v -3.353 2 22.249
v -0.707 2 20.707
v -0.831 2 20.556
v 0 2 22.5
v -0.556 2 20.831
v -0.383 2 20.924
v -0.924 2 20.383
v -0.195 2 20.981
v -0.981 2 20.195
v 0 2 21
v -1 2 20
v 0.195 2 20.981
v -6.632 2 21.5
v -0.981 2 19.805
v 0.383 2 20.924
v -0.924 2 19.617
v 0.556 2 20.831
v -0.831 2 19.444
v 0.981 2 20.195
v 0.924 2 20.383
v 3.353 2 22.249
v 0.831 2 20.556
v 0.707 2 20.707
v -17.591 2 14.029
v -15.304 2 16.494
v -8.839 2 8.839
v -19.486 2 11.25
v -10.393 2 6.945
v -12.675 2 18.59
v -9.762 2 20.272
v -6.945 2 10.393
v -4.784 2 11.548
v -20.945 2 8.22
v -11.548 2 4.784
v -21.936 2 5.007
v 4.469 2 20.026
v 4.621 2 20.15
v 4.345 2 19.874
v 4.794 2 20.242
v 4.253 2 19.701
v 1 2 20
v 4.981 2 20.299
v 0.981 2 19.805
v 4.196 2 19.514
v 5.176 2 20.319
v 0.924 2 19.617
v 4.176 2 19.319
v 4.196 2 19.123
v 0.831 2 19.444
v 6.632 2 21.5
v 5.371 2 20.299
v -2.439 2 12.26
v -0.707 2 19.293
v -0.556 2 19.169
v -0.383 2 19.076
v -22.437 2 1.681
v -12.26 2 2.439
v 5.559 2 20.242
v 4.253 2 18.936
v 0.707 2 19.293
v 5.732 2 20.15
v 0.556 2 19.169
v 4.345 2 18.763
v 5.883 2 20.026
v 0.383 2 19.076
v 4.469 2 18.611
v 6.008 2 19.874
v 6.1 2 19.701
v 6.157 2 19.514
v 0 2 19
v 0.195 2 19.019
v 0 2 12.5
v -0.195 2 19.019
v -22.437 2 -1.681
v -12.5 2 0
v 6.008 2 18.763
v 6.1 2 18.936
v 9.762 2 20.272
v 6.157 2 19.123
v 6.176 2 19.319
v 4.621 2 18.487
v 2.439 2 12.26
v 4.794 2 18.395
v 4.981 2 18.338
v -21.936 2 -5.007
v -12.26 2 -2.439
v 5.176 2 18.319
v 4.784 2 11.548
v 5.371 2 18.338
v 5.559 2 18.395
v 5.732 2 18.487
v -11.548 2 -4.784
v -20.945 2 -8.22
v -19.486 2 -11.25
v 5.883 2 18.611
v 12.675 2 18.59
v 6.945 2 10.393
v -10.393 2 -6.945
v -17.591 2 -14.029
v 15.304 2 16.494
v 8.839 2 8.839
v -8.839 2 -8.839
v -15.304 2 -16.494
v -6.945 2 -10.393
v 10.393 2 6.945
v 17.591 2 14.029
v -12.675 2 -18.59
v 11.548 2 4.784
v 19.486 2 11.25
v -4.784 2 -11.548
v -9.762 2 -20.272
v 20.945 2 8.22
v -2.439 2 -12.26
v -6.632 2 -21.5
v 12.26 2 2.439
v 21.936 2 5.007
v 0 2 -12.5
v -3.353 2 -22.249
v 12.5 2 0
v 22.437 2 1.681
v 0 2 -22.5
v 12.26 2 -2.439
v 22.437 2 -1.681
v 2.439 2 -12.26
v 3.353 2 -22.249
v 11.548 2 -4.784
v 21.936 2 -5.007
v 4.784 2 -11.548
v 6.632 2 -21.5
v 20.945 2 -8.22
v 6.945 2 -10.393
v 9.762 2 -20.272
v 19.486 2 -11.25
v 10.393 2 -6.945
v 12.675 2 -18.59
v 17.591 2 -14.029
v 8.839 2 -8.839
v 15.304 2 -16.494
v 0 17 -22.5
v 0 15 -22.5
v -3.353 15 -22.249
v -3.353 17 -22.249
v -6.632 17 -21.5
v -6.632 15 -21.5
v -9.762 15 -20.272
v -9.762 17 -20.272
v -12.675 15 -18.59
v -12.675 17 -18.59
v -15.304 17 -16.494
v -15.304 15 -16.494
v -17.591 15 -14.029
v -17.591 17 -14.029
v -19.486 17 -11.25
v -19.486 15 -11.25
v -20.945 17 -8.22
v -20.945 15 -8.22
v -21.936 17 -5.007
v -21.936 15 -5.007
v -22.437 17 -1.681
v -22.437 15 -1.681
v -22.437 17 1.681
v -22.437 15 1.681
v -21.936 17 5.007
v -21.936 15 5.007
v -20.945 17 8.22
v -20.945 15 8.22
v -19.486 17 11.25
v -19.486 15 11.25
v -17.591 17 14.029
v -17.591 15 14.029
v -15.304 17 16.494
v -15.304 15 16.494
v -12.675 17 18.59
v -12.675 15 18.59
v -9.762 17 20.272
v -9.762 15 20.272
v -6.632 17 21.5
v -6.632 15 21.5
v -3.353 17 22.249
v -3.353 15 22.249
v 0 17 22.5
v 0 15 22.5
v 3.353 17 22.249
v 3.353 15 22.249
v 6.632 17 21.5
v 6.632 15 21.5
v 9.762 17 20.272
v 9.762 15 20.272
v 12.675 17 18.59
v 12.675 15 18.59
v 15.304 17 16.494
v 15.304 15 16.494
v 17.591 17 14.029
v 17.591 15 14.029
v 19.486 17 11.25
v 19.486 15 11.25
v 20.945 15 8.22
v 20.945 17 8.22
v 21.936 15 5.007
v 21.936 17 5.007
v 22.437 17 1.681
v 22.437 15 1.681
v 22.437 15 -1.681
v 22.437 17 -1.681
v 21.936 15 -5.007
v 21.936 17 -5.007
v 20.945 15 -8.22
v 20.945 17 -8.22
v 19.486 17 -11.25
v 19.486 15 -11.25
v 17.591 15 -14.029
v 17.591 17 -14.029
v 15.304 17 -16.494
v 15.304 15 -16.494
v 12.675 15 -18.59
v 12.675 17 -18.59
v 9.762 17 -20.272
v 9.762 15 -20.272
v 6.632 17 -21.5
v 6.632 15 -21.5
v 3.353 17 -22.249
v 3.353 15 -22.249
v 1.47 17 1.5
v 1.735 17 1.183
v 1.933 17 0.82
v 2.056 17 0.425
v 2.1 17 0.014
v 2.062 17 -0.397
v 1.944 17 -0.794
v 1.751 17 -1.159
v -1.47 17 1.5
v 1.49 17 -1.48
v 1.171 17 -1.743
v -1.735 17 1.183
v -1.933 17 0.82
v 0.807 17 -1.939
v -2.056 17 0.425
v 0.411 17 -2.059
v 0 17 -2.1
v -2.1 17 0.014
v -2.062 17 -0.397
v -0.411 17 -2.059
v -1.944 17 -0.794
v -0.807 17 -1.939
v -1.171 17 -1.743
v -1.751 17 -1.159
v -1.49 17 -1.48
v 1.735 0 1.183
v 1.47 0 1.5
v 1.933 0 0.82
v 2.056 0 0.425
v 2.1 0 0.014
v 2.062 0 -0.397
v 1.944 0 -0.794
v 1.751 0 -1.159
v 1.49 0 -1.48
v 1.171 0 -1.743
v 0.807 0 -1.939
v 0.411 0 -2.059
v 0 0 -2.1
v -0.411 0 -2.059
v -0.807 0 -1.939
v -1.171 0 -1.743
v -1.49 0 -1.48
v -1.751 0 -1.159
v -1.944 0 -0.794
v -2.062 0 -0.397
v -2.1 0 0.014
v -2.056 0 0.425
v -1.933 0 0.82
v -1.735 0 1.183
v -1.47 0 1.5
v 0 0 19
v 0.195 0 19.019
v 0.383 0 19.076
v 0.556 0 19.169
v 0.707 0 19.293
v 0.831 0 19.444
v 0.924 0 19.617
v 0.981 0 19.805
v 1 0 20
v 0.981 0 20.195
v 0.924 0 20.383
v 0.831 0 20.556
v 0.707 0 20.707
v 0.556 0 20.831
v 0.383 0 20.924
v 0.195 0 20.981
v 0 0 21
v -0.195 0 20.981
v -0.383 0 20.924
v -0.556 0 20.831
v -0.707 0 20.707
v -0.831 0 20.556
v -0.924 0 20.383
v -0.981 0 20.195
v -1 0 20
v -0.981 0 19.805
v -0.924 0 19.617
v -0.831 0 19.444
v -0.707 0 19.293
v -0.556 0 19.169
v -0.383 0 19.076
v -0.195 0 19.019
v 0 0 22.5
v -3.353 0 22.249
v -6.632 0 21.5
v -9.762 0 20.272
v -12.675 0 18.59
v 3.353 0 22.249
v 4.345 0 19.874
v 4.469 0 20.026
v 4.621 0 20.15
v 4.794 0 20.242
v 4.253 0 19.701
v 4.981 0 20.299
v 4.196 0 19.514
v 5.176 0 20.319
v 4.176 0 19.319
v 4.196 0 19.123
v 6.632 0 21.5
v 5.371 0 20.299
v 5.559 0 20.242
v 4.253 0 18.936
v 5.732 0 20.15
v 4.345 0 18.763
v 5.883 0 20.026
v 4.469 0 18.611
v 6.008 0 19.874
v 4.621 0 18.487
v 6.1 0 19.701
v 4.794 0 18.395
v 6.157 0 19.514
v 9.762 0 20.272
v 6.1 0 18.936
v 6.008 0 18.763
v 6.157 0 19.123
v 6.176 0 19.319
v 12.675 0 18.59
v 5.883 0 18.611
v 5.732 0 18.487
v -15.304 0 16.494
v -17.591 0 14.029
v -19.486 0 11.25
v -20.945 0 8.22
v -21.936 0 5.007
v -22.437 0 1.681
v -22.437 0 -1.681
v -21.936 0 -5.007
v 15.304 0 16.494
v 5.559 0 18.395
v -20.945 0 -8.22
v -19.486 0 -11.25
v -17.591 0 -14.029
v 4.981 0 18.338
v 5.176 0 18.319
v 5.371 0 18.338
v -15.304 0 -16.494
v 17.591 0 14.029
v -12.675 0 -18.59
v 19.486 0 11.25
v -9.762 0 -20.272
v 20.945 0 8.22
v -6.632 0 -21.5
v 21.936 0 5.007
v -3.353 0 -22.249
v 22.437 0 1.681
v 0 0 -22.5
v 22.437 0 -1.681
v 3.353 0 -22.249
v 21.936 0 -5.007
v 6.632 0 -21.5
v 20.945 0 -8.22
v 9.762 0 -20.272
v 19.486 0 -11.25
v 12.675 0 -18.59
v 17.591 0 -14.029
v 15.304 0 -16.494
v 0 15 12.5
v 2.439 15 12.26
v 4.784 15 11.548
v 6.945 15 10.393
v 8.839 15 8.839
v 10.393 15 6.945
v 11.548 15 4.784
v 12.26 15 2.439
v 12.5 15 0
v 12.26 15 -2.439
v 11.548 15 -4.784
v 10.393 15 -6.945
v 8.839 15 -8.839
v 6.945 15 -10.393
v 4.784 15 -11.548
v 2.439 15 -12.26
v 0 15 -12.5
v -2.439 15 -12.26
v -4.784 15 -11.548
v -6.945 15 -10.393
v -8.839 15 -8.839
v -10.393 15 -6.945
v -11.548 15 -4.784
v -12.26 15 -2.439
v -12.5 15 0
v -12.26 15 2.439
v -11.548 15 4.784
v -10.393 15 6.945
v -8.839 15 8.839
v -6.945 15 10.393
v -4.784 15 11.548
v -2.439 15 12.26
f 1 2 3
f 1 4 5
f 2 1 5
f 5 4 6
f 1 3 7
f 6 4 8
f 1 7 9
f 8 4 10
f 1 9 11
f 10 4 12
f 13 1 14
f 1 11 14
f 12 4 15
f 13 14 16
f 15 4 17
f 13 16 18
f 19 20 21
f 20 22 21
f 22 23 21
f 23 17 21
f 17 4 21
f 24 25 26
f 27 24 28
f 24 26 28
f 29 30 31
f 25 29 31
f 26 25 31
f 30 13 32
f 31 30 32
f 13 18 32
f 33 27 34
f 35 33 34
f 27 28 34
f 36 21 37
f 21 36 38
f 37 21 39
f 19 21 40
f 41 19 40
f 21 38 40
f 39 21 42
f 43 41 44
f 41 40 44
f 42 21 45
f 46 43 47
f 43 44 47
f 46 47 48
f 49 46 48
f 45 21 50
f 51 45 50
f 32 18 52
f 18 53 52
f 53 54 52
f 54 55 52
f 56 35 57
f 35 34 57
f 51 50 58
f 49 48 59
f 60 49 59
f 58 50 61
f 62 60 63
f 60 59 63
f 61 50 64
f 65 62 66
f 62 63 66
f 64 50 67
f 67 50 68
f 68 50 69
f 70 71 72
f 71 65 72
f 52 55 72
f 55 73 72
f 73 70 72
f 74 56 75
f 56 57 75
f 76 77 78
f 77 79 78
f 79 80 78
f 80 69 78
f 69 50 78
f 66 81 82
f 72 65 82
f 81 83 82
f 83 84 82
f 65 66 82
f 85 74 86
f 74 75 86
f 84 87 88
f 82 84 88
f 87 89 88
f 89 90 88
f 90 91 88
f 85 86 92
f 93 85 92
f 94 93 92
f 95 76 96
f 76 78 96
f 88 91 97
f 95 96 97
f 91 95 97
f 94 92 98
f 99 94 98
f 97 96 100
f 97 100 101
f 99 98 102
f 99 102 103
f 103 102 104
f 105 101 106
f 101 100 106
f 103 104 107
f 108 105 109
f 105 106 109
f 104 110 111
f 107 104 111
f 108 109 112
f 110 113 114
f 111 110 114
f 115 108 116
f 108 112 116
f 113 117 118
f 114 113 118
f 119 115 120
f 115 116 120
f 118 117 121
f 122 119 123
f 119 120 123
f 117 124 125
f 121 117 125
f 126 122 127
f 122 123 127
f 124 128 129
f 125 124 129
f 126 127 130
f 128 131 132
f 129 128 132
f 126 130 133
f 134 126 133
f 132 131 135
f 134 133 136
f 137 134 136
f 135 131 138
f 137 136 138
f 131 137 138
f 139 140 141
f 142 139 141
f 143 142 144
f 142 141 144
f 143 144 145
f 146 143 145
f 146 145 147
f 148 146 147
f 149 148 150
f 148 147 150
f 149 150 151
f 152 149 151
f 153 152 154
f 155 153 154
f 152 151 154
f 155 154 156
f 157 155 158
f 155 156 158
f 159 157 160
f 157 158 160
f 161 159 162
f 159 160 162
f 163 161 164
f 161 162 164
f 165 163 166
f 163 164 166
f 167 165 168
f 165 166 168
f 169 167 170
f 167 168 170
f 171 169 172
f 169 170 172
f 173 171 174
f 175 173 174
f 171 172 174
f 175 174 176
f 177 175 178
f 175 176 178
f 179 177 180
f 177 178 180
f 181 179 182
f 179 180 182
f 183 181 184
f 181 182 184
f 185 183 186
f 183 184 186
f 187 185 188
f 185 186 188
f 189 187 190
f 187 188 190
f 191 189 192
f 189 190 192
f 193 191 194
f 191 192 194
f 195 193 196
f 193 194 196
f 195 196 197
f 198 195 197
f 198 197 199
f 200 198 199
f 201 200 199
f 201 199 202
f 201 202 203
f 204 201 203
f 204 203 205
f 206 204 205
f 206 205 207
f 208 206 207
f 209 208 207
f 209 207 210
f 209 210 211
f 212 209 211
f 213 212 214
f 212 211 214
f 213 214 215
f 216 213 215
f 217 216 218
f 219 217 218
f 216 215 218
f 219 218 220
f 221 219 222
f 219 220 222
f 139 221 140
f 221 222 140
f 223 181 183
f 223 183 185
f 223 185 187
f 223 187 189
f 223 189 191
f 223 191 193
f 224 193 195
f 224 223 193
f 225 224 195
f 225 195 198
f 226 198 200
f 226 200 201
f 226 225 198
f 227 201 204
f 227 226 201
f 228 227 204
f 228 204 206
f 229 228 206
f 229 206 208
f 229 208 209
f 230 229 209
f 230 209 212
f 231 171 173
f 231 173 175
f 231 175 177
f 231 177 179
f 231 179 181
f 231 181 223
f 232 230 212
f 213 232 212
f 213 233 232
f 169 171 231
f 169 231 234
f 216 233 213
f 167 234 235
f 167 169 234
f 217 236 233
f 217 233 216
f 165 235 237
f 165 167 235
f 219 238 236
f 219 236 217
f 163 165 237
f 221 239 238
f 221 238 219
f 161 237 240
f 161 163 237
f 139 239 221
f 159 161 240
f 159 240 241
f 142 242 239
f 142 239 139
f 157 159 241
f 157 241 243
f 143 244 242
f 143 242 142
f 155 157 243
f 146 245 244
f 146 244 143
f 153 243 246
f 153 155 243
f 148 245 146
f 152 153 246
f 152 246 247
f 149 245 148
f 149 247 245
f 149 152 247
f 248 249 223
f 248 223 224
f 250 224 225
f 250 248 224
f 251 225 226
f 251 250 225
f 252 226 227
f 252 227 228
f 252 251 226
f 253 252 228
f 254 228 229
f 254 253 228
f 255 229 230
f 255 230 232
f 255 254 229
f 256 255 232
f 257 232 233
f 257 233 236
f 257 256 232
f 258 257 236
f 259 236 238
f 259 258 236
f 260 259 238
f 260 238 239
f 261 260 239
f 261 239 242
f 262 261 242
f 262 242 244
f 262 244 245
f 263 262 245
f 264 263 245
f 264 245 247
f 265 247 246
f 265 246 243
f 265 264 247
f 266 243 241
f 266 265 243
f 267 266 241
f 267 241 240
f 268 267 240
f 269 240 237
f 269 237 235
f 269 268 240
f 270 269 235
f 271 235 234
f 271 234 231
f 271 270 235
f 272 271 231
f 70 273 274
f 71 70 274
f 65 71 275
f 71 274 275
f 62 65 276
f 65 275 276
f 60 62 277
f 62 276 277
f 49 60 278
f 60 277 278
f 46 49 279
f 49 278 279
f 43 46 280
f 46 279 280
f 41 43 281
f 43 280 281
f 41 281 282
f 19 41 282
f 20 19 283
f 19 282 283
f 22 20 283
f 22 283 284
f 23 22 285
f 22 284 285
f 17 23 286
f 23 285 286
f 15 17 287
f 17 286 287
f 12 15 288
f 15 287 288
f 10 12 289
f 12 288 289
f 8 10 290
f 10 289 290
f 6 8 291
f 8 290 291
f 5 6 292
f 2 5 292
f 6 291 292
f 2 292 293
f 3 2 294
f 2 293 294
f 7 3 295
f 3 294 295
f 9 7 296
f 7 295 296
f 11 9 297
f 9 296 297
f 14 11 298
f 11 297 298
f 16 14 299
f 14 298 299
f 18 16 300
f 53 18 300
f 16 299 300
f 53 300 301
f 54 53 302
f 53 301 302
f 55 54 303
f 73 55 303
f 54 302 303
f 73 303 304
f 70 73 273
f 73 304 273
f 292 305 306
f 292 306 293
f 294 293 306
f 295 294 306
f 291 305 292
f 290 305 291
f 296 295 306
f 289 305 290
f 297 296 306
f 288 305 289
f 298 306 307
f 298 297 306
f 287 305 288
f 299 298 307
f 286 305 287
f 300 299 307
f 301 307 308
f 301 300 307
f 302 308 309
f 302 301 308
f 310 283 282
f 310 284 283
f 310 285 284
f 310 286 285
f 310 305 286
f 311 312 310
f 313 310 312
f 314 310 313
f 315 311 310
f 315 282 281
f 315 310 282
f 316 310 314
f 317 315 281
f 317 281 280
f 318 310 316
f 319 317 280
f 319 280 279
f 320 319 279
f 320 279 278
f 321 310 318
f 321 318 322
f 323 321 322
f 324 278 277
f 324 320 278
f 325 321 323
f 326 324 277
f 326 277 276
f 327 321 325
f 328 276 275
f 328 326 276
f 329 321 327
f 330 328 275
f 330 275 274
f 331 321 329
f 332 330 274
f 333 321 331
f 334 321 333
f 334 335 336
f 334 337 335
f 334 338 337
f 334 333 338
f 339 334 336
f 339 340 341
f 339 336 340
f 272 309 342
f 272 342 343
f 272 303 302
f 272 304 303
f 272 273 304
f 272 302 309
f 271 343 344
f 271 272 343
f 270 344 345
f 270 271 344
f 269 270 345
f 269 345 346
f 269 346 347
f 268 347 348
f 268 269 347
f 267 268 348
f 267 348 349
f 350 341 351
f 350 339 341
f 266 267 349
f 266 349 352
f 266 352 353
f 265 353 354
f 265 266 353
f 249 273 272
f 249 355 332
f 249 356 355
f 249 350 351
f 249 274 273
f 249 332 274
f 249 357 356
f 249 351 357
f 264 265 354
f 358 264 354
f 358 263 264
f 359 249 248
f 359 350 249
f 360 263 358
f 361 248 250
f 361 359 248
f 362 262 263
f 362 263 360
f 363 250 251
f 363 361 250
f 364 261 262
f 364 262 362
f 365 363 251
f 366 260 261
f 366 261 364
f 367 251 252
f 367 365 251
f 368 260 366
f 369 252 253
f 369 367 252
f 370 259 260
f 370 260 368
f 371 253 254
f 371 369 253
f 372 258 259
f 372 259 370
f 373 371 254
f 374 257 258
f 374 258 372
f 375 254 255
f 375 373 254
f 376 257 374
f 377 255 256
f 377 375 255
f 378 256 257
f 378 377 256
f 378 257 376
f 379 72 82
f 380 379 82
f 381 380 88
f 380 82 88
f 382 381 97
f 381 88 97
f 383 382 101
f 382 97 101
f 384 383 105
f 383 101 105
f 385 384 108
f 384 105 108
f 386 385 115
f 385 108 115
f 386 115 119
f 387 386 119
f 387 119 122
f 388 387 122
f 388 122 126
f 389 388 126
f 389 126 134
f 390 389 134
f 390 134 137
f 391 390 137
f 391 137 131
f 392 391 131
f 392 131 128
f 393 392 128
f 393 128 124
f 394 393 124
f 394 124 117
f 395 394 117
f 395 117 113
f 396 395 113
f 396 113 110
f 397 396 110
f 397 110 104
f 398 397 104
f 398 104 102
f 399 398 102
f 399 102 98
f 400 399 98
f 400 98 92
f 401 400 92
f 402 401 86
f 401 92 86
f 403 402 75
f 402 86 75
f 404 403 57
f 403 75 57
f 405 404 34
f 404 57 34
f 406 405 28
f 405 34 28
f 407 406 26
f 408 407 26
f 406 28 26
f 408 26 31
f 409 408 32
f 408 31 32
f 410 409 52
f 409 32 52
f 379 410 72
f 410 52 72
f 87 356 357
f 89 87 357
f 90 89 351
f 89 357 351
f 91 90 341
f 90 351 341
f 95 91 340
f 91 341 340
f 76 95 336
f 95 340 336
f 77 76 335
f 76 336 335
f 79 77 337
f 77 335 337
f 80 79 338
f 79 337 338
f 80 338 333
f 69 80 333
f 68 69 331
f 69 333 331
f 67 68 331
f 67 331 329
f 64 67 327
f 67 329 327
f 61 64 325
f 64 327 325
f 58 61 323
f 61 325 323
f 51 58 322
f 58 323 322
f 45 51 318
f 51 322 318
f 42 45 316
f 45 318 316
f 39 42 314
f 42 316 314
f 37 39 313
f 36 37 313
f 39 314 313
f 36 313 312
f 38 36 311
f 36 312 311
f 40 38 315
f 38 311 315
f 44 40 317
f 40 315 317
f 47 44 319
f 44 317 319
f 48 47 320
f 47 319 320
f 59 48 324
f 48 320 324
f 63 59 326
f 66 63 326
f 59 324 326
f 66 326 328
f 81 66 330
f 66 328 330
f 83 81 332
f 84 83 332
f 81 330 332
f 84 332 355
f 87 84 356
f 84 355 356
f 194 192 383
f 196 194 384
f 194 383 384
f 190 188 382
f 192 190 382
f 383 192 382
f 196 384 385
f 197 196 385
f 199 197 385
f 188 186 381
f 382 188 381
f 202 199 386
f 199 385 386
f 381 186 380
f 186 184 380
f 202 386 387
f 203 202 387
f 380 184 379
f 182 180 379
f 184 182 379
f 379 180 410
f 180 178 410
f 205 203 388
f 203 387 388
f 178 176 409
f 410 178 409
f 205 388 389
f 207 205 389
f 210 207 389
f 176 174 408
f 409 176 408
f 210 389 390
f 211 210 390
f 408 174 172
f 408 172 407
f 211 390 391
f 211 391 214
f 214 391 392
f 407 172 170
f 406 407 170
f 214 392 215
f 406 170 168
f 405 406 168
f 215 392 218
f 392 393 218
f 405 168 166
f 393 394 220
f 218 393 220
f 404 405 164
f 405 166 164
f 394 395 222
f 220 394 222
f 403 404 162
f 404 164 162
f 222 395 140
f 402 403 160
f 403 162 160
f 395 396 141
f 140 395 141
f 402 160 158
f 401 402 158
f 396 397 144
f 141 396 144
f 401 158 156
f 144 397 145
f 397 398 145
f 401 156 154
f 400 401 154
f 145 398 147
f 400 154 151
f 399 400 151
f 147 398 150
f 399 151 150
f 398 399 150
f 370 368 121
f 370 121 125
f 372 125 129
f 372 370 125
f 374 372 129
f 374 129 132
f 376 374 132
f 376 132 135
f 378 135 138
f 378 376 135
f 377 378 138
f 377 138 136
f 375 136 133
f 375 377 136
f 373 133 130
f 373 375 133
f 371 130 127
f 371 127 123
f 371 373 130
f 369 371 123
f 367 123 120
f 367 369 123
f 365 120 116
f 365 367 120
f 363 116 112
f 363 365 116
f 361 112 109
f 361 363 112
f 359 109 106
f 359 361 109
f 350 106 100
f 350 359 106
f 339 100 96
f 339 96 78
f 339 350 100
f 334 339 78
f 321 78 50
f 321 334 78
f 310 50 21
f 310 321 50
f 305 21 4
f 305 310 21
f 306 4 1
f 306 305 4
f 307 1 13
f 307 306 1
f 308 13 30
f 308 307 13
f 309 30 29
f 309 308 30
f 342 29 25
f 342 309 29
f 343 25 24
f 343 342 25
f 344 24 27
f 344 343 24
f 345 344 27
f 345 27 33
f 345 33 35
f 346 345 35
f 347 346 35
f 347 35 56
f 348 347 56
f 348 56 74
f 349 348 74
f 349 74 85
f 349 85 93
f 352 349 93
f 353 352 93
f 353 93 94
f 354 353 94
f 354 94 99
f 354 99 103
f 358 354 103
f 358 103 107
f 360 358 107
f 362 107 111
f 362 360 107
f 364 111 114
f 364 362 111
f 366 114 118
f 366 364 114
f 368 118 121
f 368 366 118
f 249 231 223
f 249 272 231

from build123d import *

# Parameters (mm, degrees)
SKETCH_1_R      = 12.5
EXTRUDE_1_DEPTH = 15
SKETCH_2_R      = 22.5
SKETCH_2_R_2    = 1
EXTRUDE_2_DEPTH = 2
SKETCH_3_R      = 22.5
EXTRUDE_3_DEPTH = 2


with BuildPart() as part:
    # 草图1 → 凸台-拉伸1 (new body)
    with BuildSketch(Plane(origin=(0, 0, 0), x_dir=(1, 0, 0), z_dir=(0, 1, 0))):
        with Locations(Location((0, 0, 0), (0, 0, 270))):
            Circle(SKETCH_1_R)
        with BuildLine():
            Line((-1.469693846, -1.5), (1.469693846, -1.5))
            ThreePointArc((1.469693846, -1.5), (0, 2.1), (-1.469693846, -1.5))
        make_face(mode=Mode.SUBTRACT)
    extrude(amount=EXTRUDE_1_DEPTH)

    # 草图2 → 凸台-拉伸2 (add)
    with BuildSketch(Plane.XZ):
        with Locations(Location((0, 0, 0), (0, 0, 270))):
            Circle(SKETCH_2_R)
        with Locations(Location((0, 20, 0), (0, 0, 270))):
            Circle(SKETCH_2_R_2, mode=Mode.SUBTRACT)
        with Locations(Location((5.176380902, 19.318516526, 0), (0, 0, 270))):
            Circle(SKETCH_2_R_2, mode=Mode.SUBTRACT)
        with BuildLine():
            Line((-1.469693846, 1.5), (1.469693846, 1.5))
            ThreePointArc((1.469693846, 1.5), (0, -2.1), (-1.469693846, 1.5))
        make_face(mode=Mode.SUBTRACT)
    extrude(amount=-EXTRUDE_2_DEPTH)

    # 草图3 → 凸台-拉伸3 (add)
    with BuildSketch(Plane(origin=(0, 15, 0), x_dir=(1, 0, 0), z_dir=(0, 1, 0))):
        with Locations(Location((0, 0, 0), (0, 0, 90))):
            Circle(SKETCH_3_R)
        with BuildLine():
            Line((-1.469693846, -1.5), (1.469693846, -1.5))
            ThreePointArc((1.469693846, -1.5), (0, 2.1), (-1.469693846, -1.5))
        make_face(mode=Mode.SUBTRACT)
    extrude(amount=EXTRUDE_3_DEPTH)


solid = part.part
